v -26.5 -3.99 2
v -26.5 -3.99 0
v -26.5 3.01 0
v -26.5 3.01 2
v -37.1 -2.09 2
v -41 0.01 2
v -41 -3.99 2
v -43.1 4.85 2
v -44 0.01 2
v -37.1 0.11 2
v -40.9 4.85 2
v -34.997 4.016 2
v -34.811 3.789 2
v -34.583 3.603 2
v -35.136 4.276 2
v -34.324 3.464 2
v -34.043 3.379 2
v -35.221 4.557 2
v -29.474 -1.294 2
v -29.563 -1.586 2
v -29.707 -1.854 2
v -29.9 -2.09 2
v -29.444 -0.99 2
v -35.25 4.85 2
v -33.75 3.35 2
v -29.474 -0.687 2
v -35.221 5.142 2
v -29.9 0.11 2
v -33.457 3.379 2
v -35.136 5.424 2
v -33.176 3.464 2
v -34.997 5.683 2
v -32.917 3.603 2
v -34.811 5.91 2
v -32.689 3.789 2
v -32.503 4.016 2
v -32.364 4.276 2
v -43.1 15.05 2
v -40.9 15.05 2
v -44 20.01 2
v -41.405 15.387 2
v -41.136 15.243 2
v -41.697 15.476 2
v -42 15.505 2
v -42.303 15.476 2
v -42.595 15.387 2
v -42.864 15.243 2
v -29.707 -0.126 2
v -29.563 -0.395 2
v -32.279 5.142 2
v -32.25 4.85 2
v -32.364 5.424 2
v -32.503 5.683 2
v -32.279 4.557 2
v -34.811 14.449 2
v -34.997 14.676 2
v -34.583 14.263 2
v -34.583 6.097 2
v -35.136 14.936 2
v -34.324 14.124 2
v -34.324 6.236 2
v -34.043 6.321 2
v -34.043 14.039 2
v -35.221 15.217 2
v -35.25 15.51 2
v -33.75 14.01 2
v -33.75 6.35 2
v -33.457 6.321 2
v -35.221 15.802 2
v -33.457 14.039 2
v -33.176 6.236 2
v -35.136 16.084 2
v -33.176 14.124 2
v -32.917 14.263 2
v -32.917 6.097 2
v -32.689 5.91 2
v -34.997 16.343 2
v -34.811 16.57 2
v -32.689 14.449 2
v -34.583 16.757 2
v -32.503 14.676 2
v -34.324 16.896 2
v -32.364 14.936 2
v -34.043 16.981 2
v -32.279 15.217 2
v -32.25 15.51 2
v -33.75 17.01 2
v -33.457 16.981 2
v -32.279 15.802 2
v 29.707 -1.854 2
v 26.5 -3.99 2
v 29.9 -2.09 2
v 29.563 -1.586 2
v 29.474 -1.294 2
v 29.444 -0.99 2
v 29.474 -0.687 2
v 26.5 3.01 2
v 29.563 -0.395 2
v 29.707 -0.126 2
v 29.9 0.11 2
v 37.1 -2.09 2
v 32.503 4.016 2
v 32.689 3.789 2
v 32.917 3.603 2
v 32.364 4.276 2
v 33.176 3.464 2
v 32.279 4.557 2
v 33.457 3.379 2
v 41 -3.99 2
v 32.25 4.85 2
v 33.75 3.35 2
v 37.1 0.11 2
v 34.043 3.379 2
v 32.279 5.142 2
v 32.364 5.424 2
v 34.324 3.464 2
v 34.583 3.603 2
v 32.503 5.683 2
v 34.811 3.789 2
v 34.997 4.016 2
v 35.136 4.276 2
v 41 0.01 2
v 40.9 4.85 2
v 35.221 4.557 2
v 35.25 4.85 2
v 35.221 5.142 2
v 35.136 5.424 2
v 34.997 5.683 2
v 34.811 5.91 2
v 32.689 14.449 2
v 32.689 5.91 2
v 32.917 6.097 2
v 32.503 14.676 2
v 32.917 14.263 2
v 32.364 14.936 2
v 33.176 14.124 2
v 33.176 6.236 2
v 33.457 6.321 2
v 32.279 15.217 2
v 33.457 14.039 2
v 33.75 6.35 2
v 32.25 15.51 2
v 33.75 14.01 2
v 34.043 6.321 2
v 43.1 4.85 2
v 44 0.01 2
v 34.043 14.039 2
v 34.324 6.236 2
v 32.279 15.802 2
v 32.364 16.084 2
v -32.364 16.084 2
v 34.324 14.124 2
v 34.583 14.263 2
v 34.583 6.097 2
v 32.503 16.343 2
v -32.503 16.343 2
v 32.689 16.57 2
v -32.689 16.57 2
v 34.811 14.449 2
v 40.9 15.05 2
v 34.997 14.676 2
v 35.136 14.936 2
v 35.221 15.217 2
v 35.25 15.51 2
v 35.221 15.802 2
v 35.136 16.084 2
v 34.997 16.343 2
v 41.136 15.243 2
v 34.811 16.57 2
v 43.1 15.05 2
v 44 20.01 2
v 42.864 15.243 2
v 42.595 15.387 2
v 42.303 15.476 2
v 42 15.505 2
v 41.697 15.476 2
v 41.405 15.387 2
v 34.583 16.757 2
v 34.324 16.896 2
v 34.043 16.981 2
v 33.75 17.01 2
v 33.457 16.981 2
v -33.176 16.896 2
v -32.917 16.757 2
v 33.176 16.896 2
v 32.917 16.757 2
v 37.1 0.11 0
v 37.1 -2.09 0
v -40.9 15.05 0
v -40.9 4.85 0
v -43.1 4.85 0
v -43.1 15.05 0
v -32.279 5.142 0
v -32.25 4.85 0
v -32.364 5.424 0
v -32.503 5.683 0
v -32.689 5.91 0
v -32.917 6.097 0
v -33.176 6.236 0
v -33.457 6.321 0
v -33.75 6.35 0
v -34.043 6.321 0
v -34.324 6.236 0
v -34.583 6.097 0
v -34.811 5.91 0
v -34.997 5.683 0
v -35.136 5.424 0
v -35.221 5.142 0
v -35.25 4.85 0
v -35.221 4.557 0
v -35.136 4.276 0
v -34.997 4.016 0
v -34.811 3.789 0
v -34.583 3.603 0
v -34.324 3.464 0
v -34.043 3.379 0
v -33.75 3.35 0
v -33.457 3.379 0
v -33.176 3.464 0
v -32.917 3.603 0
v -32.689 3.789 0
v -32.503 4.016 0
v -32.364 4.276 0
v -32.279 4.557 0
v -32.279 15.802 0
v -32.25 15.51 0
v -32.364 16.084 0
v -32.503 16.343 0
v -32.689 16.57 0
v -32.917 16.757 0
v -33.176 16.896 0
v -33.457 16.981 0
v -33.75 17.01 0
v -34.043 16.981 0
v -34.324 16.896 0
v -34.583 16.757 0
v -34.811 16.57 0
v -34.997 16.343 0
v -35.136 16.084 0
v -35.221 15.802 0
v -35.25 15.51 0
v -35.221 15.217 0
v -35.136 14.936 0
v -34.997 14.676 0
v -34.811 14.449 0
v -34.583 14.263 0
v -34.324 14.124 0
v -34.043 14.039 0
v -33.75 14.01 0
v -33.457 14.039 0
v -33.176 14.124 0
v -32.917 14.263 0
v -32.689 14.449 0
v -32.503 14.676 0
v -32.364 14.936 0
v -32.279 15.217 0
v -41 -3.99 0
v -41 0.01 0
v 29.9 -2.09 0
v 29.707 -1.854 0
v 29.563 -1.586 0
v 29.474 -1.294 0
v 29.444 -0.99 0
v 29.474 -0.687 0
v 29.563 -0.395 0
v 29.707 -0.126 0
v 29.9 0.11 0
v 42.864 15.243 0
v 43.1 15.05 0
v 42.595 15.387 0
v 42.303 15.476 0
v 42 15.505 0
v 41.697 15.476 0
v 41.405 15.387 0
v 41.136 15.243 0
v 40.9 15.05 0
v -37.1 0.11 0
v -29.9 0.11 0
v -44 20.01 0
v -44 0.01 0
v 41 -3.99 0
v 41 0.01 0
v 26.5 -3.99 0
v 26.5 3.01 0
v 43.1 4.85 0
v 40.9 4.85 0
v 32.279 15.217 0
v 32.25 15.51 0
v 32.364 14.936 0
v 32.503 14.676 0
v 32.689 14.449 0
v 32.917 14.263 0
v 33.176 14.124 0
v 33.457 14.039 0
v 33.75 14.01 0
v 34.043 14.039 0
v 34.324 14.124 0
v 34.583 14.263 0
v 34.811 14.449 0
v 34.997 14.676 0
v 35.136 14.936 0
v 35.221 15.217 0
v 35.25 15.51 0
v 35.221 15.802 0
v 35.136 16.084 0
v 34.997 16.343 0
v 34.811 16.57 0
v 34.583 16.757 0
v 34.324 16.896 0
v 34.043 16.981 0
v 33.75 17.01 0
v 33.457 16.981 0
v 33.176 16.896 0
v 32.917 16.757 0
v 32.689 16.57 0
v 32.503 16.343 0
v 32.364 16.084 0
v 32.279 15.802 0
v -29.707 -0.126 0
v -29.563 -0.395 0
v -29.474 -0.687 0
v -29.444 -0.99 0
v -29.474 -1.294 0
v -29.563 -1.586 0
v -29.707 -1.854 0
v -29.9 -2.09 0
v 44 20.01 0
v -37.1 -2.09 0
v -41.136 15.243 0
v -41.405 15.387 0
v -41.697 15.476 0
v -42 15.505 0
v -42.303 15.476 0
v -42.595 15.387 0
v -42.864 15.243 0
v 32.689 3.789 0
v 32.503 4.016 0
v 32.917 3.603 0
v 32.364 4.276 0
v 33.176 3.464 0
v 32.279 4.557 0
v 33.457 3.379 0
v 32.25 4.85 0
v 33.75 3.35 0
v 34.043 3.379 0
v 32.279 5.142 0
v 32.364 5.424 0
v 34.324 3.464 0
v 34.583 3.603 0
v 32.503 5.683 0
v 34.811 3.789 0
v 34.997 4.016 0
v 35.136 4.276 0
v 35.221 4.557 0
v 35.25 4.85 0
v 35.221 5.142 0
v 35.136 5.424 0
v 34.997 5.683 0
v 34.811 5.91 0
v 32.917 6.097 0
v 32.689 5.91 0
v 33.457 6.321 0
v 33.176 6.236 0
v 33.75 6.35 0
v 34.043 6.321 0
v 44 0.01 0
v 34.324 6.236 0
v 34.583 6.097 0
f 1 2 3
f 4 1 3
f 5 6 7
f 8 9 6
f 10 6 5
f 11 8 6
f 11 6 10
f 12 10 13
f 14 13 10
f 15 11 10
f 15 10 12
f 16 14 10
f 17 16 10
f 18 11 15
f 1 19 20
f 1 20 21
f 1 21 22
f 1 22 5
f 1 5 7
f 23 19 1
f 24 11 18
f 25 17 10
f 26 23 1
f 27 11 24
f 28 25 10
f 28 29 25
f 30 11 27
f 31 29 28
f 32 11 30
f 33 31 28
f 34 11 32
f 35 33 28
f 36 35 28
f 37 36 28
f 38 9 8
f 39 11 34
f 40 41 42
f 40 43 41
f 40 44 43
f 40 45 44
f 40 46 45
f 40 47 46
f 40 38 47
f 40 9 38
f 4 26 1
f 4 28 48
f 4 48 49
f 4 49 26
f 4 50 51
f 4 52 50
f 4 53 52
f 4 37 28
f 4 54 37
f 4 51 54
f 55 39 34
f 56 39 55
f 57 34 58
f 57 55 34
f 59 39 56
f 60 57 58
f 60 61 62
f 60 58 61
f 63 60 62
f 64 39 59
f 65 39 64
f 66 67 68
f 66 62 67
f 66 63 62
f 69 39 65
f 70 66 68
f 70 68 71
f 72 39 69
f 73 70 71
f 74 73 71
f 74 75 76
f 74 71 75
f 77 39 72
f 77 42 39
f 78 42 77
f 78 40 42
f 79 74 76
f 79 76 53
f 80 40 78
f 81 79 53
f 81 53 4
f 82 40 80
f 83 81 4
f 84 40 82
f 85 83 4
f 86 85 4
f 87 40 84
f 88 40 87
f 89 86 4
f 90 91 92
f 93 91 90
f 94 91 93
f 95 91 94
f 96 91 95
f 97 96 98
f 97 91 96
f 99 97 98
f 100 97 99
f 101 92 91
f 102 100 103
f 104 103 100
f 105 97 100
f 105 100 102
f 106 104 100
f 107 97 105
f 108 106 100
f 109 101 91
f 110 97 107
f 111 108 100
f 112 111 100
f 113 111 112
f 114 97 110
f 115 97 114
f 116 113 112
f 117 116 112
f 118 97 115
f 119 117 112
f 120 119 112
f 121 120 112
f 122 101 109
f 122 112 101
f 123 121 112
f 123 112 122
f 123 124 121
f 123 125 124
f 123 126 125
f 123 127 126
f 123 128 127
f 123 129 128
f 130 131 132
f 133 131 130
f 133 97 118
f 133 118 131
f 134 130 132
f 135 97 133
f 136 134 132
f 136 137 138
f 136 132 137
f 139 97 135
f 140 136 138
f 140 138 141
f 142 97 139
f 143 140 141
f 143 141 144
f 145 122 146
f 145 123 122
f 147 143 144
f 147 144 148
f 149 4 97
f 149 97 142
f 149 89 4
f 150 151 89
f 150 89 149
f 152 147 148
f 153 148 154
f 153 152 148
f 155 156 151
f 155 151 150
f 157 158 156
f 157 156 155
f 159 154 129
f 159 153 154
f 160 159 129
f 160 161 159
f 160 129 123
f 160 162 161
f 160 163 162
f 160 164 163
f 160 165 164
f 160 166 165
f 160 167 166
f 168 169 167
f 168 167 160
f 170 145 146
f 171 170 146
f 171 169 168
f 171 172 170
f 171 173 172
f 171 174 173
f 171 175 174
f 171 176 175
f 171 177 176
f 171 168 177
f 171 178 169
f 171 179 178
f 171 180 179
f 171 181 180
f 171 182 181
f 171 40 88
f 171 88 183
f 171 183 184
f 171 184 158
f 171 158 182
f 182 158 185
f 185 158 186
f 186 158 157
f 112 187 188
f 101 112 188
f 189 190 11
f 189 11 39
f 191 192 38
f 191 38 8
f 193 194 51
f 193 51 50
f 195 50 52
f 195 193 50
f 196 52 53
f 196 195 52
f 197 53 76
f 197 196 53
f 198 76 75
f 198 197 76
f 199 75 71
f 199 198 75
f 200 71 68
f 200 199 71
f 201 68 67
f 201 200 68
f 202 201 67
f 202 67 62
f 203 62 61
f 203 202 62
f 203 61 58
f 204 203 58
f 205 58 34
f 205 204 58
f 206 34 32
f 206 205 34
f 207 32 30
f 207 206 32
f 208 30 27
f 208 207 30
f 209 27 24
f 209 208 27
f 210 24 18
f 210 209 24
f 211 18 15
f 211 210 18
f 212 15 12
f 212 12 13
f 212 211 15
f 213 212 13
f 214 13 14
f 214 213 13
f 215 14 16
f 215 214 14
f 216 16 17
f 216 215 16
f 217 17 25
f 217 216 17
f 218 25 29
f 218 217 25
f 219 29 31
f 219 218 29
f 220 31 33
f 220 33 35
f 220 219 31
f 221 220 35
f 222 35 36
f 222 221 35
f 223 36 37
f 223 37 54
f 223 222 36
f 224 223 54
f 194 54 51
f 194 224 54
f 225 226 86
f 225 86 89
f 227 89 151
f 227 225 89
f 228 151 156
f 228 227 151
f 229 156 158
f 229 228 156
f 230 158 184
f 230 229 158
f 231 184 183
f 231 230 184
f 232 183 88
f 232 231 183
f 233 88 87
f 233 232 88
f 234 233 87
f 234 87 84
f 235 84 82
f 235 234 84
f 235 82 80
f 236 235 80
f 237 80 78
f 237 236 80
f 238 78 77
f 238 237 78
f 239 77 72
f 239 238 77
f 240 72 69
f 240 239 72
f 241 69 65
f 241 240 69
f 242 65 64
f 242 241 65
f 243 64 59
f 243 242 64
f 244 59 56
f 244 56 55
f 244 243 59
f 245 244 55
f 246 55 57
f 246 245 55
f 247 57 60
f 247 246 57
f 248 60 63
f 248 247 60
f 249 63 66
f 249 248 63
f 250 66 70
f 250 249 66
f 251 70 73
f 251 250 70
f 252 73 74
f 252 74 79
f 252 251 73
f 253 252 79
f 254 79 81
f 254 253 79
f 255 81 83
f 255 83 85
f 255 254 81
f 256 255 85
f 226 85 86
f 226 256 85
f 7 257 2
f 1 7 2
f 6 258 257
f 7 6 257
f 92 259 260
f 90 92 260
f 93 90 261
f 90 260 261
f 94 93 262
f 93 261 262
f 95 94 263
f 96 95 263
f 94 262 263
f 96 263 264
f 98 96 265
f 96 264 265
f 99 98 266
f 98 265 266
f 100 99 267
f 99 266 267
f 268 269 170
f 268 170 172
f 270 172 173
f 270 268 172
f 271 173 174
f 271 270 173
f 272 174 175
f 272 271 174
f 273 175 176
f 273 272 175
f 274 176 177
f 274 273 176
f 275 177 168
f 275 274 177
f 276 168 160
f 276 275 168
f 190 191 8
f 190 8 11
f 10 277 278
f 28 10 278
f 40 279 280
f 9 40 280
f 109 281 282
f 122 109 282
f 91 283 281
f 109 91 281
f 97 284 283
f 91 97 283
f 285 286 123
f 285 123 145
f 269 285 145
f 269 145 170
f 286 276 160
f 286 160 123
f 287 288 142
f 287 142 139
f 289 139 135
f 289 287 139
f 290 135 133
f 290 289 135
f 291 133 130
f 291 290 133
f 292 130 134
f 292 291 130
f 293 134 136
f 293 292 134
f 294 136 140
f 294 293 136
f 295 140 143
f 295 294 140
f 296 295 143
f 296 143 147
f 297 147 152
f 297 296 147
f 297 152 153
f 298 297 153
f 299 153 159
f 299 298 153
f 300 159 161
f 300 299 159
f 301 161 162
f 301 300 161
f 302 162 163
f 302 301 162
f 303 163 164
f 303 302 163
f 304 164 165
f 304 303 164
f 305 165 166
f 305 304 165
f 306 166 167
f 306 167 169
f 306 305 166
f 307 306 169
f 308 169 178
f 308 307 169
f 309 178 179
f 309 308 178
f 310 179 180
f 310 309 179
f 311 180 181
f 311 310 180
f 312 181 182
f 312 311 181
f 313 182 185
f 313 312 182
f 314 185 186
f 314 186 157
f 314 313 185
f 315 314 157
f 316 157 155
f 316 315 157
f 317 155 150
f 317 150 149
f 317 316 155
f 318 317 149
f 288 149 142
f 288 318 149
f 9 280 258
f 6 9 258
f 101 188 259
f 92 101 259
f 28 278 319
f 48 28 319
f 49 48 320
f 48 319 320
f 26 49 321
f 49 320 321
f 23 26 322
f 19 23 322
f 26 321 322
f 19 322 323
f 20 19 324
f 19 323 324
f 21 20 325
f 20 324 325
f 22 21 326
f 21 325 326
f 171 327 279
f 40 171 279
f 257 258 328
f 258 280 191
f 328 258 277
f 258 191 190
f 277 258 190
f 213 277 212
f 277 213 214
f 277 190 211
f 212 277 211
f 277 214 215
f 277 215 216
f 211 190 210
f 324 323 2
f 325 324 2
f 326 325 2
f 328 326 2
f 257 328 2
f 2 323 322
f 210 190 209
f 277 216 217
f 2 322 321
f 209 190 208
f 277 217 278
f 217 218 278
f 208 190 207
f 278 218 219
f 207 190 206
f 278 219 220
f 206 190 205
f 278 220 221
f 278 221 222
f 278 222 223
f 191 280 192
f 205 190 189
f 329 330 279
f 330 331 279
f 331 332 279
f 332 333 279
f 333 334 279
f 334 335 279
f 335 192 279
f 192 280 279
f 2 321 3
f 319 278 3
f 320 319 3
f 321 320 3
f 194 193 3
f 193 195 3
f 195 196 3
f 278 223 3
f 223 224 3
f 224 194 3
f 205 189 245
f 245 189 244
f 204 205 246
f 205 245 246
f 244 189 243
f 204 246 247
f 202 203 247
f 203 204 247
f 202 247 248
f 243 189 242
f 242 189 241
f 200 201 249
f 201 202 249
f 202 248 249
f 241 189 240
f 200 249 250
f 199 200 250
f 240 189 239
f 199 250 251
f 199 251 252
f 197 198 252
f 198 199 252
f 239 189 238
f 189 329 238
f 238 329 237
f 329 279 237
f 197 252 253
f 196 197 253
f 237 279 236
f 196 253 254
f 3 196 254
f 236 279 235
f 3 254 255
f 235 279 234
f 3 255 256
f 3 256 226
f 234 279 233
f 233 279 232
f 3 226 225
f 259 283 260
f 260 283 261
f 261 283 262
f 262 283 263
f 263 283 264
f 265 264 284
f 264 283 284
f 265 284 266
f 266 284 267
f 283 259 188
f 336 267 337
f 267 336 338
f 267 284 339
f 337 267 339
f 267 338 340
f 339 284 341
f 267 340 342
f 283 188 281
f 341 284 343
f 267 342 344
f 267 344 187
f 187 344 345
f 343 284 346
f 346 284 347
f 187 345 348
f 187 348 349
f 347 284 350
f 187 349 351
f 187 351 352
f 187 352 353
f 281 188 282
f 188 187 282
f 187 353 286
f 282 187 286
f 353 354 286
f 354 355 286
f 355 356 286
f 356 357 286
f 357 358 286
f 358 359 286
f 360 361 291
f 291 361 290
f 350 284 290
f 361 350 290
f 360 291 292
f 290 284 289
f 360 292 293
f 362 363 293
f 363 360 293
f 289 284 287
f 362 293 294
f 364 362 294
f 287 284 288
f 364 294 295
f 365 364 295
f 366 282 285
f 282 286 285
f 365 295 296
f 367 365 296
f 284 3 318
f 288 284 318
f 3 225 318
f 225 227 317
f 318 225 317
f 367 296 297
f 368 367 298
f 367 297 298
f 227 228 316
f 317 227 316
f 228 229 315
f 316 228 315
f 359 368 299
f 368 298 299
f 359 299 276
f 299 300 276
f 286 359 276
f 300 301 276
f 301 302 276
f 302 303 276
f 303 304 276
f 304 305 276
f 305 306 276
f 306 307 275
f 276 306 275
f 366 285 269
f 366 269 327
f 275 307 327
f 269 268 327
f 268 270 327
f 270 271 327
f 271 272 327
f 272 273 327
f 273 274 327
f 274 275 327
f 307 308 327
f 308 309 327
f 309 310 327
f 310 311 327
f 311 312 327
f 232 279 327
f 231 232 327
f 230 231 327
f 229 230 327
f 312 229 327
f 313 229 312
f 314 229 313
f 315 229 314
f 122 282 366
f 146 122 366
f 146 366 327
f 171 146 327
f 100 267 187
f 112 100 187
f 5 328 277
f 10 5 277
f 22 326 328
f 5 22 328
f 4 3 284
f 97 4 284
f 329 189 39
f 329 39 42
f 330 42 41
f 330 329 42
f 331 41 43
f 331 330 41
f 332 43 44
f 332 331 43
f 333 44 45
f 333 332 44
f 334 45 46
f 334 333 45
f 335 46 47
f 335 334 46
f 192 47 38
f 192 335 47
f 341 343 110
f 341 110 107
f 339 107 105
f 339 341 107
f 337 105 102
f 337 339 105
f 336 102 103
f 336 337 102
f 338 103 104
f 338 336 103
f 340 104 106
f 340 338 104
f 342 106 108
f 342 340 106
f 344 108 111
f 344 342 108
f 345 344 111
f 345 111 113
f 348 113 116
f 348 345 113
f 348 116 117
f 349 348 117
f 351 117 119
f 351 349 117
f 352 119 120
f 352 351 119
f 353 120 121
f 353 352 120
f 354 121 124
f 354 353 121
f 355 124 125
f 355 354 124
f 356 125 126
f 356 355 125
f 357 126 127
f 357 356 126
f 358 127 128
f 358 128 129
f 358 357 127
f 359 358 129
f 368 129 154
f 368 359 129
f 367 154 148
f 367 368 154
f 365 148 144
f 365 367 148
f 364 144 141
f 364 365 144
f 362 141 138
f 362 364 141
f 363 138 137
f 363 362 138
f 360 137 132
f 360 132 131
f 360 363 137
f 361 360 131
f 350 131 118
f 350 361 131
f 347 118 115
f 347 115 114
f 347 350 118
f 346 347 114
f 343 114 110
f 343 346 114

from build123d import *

# Parameters (mm, degrees)
SKETCH_3_R      = 1.5
EXTRUDE_1_DEPTH = 2


with BuildPart() as part:
    # 草图3 → 凸台-拉伸1 (new body)
    with BuildSketch(Plane.XY):
        Polygon((41, 20.009783315), (-41, 20.009783315), (-44, 20.009783315), (-44, 15.009783315), (-44, 5.009783315), (-44, 0.009783315), (-41, 0.009783315), (-41, -3.990216685), (-26.5, -3.990216685), (-26.5, 3.009783315), (26.5, 3.009783315), (26.5, -3.990216685), (41, -3.990216685), (41, 0.009783315), (44, 0.009783315), (44, 5.009783315), (44, 15.009783315), (44, 20.009783315), align=None)
        with Locations((-33.75, 15.509783315)):
            Circle(SKETCH_3_R, mode=Mode.SUBTRACT)
        with Locations((-33.75, 4.849783315)):
            Circle(SKETCH_3_R, mode=Mode.SUBTRACT)
        with Locations(Location((33.75, 4.849783315, 0), (0, 0, 180))):
            Circle(SKETCH_3_R, mode=Mode.SUBTRACT)
        with Locations(Location((33.75, 15.509783315, 0), (0, 0, 180))):
            Circle(SKETCH_3_R, mode=Mode.SUBTRACT)
        with BuildLine():
            Line((37.1, -2.090216685), (29.9, -2.090216685))
            ThreePointArc((29.9, -2.090216685), (29.444365081, -0.990216685), (29.9, 0.109783315))
            Line((29.9, 0.109783315), (37.1, 0.109783315))
            Line((37.1, 0.109783315), (37.1, -2.090216685))
        make_face(mode=Mode.SUBTRACT)
        with BuildLine():
            Line((-37.1, 0.109783315), (-29.9, 0.109783315))
            ThreePointArc((-29.9, 0.109783315), (-29.444365081, -0.990216685), (-29.9, -2.090216685))
            Line((-29.9, -2.090216685), (-37.1, -2.090216685))
            Line((-37.1, -2.090216685), (-37.1, 0.109783315))
        make_face(mode=Mode.SUBTRACT)
        with BuildLine():
            Line((-43.1, 15.049783315), (-43.1, 4.849783315))
            Line((-43.1, 4.849783315), (-40.9, 4.849783315))
            Line((-40.9, 4.849783315), (-40.9, 15.049783315))
            ThreePointArc((-40.9, 15.049783315), (-42, 15.505418233), (-43.1, 15.049783315))
        make_face(mode=Mode.SUBTRACT)
        with BuildLine():
            Line((40.9, 15.049783315), (40.9, 4.849783315))
            Line((40.9, 4.849783315), (43.1, 4.849783315))
            Line((43.1, 4.849783315), (43.1, 15.049783315))
            ThreePointArc((43.1, 15.049783315), (42, 15.505418233), (40.9, 15.049783315))
        make_face(mode=Mode.SUBTRACT)
    extrude(amount=EXTRUDE_1_DEPTH)


solid = part.part
